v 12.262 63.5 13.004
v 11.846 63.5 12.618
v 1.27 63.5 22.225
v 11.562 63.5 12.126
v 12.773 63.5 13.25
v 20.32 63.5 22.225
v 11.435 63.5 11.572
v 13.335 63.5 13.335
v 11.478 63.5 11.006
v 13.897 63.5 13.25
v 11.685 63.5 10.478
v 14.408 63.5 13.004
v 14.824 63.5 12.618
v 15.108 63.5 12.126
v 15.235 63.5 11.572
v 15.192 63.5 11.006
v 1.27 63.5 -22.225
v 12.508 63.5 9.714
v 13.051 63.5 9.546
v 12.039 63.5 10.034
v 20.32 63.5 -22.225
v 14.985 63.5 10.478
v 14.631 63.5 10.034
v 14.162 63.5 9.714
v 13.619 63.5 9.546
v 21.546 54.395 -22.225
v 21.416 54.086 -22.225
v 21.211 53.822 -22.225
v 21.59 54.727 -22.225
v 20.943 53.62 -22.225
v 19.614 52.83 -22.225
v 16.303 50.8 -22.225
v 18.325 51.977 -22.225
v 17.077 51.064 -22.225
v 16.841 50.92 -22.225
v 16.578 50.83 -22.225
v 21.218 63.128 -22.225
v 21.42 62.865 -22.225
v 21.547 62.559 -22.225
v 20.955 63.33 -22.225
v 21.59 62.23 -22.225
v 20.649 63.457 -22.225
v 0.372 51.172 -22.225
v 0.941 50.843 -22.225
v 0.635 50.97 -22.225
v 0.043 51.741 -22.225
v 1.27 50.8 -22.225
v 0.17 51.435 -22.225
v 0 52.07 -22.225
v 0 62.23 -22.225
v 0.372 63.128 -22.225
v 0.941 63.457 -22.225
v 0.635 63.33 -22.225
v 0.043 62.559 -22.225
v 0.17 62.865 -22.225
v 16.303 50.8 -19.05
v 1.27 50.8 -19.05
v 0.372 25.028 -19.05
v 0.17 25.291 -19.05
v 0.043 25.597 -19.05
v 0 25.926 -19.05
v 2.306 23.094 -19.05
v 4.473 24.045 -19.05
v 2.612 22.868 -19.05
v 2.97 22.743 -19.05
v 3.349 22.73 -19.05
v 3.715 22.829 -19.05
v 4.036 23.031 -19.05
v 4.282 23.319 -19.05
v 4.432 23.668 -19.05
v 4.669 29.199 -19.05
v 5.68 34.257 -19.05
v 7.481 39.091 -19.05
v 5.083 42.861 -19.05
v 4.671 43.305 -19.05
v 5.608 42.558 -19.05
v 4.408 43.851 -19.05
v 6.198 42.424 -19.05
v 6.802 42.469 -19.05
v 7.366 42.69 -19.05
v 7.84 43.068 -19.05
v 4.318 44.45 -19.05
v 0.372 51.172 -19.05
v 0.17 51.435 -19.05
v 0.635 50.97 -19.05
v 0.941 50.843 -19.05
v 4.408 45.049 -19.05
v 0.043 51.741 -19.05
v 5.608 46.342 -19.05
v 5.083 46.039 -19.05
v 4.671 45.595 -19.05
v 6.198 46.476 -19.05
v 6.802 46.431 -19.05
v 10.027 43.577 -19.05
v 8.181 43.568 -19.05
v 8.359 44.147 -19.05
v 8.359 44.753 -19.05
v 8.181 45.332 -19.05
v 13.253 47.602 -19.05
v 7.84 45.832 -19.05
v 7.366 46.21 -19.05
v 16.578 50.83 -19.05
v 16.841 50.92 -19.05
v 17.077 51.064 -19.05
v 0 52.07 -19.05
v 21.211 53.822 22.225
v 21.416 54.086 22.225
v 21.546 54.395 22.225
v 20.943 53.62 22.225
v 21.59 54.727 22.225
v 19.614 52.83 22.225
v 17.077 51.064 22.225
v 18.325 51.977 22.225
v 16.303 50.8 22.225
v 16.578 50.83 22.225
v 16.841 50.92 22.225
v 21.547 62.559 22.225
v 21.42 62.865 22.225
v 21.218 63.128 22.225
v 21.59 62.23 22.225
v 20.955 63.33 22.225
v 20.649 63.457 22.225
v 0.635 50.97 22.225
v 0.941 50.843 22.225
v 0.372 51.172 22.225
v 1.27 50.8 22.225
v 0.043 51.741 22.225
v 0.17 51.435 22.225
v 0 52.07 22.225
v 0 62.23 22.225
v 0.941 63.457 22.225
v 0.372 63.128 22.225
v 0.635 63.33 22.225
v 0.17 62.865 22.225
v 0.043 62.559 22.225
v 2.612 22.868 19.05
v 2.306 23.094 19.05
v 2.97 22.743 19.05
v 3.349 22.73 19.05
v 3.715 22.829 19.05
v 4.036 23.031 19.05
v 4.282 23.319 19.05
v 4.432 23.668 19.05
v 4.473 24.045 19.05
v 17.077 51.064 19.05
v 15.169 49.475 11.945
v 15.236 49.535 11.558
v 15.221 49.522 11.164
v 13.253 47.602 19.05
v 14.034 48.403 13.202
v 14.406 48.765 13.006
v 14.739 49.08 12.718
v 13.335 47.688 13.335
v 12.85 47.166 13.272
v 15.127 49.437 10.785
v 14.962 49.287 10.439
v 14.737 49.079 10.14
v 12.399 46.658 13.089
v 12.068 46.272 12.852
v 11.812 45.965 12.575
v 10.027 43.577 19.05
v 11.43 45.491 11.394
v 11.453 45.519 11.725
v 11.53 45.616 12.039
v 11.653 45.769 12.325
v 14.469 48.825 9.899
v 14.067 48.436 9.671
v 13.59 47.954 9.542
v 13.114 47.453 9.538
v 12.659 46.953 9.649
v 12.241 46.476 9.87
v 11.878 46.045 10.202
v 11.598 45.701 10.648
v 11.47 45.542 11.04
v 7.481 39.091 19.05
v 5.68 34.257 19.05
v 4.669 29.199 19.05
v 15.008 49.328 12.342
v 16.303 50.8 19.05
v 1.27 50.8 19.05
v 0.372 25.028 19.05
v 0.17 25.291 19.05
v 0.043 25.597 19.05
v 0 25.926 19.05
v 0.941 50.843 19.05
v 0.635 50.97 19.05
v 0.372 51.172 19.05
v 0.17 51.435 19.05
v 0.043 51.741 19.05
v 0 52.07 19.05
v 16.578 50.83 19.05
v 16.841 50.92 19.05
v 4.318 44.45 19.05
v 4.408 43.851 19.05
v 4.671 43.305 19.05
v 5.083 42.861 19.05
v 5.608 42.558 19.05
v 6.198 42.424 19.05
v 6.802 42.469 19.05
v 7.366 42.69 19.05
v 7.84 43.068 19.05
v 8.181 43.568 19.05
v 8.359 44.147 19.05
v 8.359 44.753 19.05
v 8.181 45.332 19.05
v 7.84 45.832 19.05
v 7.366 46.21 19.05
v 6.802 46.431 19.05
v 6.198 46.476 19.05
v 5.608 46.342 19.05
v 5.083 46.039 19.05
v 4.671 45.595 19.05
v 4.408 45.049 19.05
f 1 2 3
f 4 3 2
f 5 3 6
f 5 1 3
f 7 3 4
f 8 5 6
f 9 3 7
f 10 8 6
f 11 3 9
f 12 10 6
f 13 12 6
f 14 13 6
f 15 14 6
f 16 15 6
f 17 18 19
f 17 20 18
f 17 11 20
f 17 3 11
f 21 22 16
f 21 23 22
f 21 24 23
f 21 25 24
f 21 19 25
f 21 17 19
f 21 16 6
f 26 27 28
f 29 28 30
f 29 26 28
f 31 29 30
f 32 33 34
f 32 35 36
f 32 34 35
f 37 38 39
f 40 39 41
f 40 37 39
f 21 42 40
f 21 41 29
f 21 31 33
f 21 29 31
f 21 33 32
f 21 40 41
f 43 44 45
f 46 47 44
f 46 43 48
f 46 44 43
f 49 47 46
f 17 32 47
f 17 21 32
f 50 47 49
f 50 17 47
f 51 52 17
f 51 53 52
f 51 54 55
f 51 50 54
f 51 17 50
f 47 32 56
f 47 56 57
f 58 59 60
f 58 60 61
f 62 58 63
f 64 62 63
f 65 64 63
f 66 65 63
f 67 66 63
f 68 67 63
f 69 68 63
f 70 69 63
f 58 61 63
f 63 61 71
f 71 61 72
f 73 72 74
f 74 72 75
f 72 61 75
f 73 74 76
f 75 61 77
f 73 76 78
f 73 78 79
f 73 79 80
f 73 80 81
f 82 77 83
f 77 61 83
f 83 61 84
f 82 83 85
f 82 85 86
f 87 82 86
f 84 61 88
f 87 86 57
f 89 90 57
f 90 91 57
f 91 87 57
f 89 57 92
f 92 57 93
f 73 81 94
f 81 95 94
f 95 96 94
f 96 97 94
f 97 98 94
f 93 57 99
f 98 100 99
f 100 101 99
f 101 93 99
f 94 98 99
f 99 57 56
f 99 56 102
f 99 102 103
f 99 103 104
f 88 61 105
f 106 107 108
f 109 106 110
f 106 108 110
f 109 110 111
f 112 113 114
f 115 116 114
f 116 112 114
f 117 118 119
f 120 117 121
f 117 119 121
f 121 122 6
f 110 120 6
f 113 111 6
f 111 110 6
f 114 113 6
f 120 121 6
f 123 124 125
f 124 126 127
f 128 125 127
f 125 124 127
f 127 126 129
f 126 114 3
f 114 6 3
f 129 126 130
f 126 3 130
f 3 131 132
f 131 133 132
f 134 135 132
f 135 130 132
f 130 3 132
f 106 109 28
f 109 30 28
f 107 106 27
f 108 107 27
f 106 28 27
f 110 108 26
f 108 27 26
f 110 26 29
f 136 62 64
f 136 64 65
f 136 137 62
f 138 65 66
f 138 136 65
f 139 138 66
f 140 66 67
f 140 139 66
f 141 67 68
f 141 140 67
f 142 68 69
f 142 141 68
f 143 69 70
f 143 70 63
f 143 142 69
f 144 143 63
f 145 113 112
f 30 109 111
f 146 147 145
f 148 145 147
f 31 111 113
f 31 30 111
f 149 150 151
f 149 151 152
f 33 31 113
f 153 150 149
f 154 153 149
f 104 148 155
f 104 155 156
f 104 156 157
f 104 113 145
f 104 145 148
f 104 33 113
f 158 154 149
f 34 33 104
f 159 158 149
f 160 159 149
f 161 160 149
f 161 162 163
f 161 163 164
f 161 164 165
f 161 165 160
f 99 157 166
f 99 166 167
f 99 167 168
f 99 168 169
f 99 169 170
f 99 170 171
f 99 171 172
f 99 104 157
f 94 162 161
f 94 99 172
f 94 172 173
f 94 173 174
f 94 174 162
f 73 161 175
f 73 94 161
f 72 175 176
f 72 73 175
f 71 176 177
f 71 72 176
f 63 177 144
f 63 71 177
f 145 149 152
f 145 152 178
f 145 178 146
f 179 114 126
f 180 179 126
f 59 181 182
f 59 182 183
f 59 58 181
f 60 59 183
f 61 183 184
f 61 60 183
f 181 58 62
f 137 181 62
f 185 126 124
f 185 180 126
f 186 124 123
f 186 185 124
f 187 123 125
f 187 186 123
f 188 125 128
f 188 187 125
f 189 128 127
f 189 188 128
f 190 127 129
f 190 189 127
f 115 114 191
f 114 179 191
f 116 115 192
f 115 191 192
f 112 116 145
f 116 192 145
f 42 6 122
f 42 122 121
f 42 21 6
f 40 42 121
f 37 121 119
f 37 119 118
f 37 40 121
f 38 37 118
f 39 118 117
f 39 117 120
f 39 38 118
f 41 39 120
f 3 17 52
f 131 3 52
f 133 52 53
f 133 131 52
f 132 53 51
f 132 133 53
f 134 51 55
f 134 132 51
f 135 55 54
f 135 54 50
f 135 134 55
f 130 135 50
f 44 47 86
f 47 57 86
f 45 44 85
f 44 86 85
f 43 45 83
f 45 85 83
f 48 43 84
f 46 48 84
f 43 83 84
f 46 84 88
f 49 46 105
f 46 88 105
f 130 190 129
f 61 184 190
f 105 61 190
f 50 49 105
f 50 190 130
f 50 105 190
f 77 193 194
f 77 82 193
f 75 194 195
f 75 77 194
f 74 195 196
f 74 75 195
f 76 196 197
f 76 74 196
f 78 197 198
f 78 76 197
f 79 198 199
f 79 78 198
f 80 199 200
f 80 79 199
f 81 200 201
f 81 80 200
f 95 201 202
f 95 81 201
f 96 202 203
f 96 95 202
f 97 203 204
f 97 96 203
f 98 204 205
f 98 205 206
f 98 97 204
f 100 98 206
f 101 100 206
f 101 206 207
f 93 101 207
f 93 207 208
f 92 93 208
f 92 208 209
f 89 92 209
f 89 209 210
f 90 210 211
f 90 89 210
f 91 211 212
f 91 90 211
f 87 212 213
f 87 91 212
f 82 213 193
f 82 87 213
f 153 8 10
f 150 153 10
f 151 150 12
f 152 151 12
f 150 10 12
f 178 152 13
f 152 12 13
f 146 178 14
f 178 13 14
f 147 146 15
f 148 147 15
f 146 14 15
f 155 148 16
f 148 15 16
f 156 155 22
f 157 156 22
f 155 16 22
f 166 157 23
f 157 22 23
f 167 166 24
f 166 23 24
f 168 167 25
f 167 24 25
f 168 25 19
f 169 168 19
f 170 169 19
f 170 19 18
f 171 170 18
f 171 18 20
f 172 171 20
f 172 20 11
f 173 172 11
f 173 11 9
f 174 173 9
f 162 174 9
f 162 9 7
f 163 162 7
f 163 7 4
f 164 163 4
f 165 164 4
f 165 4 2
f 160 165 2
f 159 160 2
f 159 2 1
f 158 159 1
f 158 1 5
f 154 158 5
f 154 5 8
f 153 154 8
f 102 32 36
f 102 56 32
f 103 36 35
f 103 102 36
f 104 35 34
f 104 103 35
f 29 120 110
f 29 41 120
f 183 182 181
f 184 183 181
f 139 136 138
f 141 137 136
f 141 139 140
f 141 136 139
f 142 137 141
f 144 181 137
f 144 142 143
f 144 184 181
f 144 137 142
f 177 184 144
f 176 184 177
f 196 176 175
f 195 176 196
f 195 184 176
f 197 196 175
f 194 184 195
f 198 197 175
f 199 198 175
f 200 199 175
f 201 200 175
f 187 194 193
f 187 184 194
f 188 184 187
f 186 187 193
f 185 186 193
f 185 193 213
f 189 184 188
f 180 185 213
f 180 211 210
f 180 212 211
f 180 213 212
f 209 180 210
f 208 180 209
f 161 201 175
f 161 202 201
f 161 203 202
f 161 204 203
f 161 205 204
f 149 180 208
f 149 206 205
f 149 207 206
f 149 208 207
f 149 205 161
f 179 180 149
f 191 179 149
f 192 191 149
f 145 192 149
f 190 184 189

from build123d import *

# Parameters (mm, degrees)
SKETCH1_R           = 2.032
BOSS_EXTRUDE1_DEPTH = 19.05
BOSS_EXTRUDE2_START = 3.175
BOSS_EXTRUDE2_DEPTH = 3.175
FILLET1_R           = 1.27
SKETCH3_R           = 1.905
CUT_EXTRUDE1_DEPTH  = 52.21483461447027


with BuildPart() as part:
    # Sketch1 → Boss-Extrude1 (new, symmetric)
    # profile 1 of 2: a face of its own
    with BuildSketch(Plane.XY):
        with BuildLine():
            Line((0, 50.8), (0, 25.40000000000009))
            Line((0, 25.40000000000009), (4.803171045006462, 20.59682895499363))
            ThreePointArc((4.803171045006465, 20.59682895499363), (7.897944154578656, 39.95075151177493), (21.589999999999996, 53.97499999999999))
            Line((21.589999999999996, 53.974999999999994), (21.589999999999996, 63.5))
            Line((21.589999999999996, 63.5), (0, 63.5))
            Line((0, 63.5), (0, 50.8))
        make_face()
        with Locations(Location((6.35, 44.449999999999996, 0), (0, 0, 180))):
            Circle(SKETCH1_R, mode=Mode.SUBTRACT)
    # profile 2 of 2: a face of its own
    with BuildSketch(Plane.XY):
        with BuildLine():
            Line((0, 50.8), (0, 25.40000000000009))
            Line((0, 25.40000000000009), (4.803171045006462, 20.59682895499363))
            ThreePointArc((4.803171045006465, 20.59682895499363), (7.897944154578656, 39.95075151177493), (21.589999999999996, 53.97499999999999))
            Line((21.589999999999996, 53.974999999999994), (21.589999999999996, 63.5))
            Line((21.589999999999996, 63.5), (0, 63.5))
            Line((0, 63.5), (0, 50.8))
        make_face()
        with Locations(Location((6.35, 44.449999999999996, 0), (0, 0, 180))):
            Circle(SKETCH1_R, mode=Mode.SUBTRACT)
    extrude(amount=BOSS_EXTRUDE1_DEPTH, both=True)

    # Sketch2 → Boss-Extrude2 (add)
    with BuildSketch(Plane.XY.offset(19.05).offset(BOSS_EXTRUDE2_START)):
        with BuildLine():
            Line((0, 63.5), (21.589999999999996, 63.5))
            Line((21.589999999999996, 63.5), (21.589999999999996, 53.974999999999994))
            ThreePointArc((21.589999999999996, 53.974999999999994), (19.09356210818939, 52.4962542782198), (16.7394991351634, 50.8))
            Line((16.7394991351634, 50.8), (1.56e-15, 50.8))
            Line((1.56e-15, 50.8), (0, 63.5))
        make_face()
    boss_extrude2 = extrude(amount=-BOSS_EXTRUDE2_DEPTH)

    # Mirror1: Boss-Extrude2 across plane
    add(boss_extrude2.mirror(Plane.XY))

    # Fillet1
    fillet1_edges = [part.edges().sort_by_distance(p)[0] for p in [
        (4.803171045006463, 20.59682895499363, 0),
        (0, 25.40000000000009, 0),
        (0, 63.5, 0),
        (21.589999999999996, 63.5, 0),
        (21.589999999999996, 53.974999999999994, 0),
        (1.56e-15, 50.8, 20.637500000000003),
        (16.7394991351634, 50.8, 20.637500000000003),
        (1.56e-15, 50.8, -20.637500000000003),
        (16.7394991351634, 50.8, -20.637500000000003),
    ]]
    fillet(fillet1_edges, radius=FILLET1_R)

    # Sketch3 → Cut-Extrude1 (cut, through all)
    with BuildSketch(Plane(origin=(0, 63.5, 0), x_dir=(1, 0, 0), z_dir=(0, 1, 0))):
        with Locations(Location((13.335, -11.430000000000003, 0), (0, 0, 270))):
            Circle(SKETCH3_R)
    extrude(amount=-CUT_EXTRUDE1_DEPTH, mode=Mode.SUBTRACT)


solid = part.part
